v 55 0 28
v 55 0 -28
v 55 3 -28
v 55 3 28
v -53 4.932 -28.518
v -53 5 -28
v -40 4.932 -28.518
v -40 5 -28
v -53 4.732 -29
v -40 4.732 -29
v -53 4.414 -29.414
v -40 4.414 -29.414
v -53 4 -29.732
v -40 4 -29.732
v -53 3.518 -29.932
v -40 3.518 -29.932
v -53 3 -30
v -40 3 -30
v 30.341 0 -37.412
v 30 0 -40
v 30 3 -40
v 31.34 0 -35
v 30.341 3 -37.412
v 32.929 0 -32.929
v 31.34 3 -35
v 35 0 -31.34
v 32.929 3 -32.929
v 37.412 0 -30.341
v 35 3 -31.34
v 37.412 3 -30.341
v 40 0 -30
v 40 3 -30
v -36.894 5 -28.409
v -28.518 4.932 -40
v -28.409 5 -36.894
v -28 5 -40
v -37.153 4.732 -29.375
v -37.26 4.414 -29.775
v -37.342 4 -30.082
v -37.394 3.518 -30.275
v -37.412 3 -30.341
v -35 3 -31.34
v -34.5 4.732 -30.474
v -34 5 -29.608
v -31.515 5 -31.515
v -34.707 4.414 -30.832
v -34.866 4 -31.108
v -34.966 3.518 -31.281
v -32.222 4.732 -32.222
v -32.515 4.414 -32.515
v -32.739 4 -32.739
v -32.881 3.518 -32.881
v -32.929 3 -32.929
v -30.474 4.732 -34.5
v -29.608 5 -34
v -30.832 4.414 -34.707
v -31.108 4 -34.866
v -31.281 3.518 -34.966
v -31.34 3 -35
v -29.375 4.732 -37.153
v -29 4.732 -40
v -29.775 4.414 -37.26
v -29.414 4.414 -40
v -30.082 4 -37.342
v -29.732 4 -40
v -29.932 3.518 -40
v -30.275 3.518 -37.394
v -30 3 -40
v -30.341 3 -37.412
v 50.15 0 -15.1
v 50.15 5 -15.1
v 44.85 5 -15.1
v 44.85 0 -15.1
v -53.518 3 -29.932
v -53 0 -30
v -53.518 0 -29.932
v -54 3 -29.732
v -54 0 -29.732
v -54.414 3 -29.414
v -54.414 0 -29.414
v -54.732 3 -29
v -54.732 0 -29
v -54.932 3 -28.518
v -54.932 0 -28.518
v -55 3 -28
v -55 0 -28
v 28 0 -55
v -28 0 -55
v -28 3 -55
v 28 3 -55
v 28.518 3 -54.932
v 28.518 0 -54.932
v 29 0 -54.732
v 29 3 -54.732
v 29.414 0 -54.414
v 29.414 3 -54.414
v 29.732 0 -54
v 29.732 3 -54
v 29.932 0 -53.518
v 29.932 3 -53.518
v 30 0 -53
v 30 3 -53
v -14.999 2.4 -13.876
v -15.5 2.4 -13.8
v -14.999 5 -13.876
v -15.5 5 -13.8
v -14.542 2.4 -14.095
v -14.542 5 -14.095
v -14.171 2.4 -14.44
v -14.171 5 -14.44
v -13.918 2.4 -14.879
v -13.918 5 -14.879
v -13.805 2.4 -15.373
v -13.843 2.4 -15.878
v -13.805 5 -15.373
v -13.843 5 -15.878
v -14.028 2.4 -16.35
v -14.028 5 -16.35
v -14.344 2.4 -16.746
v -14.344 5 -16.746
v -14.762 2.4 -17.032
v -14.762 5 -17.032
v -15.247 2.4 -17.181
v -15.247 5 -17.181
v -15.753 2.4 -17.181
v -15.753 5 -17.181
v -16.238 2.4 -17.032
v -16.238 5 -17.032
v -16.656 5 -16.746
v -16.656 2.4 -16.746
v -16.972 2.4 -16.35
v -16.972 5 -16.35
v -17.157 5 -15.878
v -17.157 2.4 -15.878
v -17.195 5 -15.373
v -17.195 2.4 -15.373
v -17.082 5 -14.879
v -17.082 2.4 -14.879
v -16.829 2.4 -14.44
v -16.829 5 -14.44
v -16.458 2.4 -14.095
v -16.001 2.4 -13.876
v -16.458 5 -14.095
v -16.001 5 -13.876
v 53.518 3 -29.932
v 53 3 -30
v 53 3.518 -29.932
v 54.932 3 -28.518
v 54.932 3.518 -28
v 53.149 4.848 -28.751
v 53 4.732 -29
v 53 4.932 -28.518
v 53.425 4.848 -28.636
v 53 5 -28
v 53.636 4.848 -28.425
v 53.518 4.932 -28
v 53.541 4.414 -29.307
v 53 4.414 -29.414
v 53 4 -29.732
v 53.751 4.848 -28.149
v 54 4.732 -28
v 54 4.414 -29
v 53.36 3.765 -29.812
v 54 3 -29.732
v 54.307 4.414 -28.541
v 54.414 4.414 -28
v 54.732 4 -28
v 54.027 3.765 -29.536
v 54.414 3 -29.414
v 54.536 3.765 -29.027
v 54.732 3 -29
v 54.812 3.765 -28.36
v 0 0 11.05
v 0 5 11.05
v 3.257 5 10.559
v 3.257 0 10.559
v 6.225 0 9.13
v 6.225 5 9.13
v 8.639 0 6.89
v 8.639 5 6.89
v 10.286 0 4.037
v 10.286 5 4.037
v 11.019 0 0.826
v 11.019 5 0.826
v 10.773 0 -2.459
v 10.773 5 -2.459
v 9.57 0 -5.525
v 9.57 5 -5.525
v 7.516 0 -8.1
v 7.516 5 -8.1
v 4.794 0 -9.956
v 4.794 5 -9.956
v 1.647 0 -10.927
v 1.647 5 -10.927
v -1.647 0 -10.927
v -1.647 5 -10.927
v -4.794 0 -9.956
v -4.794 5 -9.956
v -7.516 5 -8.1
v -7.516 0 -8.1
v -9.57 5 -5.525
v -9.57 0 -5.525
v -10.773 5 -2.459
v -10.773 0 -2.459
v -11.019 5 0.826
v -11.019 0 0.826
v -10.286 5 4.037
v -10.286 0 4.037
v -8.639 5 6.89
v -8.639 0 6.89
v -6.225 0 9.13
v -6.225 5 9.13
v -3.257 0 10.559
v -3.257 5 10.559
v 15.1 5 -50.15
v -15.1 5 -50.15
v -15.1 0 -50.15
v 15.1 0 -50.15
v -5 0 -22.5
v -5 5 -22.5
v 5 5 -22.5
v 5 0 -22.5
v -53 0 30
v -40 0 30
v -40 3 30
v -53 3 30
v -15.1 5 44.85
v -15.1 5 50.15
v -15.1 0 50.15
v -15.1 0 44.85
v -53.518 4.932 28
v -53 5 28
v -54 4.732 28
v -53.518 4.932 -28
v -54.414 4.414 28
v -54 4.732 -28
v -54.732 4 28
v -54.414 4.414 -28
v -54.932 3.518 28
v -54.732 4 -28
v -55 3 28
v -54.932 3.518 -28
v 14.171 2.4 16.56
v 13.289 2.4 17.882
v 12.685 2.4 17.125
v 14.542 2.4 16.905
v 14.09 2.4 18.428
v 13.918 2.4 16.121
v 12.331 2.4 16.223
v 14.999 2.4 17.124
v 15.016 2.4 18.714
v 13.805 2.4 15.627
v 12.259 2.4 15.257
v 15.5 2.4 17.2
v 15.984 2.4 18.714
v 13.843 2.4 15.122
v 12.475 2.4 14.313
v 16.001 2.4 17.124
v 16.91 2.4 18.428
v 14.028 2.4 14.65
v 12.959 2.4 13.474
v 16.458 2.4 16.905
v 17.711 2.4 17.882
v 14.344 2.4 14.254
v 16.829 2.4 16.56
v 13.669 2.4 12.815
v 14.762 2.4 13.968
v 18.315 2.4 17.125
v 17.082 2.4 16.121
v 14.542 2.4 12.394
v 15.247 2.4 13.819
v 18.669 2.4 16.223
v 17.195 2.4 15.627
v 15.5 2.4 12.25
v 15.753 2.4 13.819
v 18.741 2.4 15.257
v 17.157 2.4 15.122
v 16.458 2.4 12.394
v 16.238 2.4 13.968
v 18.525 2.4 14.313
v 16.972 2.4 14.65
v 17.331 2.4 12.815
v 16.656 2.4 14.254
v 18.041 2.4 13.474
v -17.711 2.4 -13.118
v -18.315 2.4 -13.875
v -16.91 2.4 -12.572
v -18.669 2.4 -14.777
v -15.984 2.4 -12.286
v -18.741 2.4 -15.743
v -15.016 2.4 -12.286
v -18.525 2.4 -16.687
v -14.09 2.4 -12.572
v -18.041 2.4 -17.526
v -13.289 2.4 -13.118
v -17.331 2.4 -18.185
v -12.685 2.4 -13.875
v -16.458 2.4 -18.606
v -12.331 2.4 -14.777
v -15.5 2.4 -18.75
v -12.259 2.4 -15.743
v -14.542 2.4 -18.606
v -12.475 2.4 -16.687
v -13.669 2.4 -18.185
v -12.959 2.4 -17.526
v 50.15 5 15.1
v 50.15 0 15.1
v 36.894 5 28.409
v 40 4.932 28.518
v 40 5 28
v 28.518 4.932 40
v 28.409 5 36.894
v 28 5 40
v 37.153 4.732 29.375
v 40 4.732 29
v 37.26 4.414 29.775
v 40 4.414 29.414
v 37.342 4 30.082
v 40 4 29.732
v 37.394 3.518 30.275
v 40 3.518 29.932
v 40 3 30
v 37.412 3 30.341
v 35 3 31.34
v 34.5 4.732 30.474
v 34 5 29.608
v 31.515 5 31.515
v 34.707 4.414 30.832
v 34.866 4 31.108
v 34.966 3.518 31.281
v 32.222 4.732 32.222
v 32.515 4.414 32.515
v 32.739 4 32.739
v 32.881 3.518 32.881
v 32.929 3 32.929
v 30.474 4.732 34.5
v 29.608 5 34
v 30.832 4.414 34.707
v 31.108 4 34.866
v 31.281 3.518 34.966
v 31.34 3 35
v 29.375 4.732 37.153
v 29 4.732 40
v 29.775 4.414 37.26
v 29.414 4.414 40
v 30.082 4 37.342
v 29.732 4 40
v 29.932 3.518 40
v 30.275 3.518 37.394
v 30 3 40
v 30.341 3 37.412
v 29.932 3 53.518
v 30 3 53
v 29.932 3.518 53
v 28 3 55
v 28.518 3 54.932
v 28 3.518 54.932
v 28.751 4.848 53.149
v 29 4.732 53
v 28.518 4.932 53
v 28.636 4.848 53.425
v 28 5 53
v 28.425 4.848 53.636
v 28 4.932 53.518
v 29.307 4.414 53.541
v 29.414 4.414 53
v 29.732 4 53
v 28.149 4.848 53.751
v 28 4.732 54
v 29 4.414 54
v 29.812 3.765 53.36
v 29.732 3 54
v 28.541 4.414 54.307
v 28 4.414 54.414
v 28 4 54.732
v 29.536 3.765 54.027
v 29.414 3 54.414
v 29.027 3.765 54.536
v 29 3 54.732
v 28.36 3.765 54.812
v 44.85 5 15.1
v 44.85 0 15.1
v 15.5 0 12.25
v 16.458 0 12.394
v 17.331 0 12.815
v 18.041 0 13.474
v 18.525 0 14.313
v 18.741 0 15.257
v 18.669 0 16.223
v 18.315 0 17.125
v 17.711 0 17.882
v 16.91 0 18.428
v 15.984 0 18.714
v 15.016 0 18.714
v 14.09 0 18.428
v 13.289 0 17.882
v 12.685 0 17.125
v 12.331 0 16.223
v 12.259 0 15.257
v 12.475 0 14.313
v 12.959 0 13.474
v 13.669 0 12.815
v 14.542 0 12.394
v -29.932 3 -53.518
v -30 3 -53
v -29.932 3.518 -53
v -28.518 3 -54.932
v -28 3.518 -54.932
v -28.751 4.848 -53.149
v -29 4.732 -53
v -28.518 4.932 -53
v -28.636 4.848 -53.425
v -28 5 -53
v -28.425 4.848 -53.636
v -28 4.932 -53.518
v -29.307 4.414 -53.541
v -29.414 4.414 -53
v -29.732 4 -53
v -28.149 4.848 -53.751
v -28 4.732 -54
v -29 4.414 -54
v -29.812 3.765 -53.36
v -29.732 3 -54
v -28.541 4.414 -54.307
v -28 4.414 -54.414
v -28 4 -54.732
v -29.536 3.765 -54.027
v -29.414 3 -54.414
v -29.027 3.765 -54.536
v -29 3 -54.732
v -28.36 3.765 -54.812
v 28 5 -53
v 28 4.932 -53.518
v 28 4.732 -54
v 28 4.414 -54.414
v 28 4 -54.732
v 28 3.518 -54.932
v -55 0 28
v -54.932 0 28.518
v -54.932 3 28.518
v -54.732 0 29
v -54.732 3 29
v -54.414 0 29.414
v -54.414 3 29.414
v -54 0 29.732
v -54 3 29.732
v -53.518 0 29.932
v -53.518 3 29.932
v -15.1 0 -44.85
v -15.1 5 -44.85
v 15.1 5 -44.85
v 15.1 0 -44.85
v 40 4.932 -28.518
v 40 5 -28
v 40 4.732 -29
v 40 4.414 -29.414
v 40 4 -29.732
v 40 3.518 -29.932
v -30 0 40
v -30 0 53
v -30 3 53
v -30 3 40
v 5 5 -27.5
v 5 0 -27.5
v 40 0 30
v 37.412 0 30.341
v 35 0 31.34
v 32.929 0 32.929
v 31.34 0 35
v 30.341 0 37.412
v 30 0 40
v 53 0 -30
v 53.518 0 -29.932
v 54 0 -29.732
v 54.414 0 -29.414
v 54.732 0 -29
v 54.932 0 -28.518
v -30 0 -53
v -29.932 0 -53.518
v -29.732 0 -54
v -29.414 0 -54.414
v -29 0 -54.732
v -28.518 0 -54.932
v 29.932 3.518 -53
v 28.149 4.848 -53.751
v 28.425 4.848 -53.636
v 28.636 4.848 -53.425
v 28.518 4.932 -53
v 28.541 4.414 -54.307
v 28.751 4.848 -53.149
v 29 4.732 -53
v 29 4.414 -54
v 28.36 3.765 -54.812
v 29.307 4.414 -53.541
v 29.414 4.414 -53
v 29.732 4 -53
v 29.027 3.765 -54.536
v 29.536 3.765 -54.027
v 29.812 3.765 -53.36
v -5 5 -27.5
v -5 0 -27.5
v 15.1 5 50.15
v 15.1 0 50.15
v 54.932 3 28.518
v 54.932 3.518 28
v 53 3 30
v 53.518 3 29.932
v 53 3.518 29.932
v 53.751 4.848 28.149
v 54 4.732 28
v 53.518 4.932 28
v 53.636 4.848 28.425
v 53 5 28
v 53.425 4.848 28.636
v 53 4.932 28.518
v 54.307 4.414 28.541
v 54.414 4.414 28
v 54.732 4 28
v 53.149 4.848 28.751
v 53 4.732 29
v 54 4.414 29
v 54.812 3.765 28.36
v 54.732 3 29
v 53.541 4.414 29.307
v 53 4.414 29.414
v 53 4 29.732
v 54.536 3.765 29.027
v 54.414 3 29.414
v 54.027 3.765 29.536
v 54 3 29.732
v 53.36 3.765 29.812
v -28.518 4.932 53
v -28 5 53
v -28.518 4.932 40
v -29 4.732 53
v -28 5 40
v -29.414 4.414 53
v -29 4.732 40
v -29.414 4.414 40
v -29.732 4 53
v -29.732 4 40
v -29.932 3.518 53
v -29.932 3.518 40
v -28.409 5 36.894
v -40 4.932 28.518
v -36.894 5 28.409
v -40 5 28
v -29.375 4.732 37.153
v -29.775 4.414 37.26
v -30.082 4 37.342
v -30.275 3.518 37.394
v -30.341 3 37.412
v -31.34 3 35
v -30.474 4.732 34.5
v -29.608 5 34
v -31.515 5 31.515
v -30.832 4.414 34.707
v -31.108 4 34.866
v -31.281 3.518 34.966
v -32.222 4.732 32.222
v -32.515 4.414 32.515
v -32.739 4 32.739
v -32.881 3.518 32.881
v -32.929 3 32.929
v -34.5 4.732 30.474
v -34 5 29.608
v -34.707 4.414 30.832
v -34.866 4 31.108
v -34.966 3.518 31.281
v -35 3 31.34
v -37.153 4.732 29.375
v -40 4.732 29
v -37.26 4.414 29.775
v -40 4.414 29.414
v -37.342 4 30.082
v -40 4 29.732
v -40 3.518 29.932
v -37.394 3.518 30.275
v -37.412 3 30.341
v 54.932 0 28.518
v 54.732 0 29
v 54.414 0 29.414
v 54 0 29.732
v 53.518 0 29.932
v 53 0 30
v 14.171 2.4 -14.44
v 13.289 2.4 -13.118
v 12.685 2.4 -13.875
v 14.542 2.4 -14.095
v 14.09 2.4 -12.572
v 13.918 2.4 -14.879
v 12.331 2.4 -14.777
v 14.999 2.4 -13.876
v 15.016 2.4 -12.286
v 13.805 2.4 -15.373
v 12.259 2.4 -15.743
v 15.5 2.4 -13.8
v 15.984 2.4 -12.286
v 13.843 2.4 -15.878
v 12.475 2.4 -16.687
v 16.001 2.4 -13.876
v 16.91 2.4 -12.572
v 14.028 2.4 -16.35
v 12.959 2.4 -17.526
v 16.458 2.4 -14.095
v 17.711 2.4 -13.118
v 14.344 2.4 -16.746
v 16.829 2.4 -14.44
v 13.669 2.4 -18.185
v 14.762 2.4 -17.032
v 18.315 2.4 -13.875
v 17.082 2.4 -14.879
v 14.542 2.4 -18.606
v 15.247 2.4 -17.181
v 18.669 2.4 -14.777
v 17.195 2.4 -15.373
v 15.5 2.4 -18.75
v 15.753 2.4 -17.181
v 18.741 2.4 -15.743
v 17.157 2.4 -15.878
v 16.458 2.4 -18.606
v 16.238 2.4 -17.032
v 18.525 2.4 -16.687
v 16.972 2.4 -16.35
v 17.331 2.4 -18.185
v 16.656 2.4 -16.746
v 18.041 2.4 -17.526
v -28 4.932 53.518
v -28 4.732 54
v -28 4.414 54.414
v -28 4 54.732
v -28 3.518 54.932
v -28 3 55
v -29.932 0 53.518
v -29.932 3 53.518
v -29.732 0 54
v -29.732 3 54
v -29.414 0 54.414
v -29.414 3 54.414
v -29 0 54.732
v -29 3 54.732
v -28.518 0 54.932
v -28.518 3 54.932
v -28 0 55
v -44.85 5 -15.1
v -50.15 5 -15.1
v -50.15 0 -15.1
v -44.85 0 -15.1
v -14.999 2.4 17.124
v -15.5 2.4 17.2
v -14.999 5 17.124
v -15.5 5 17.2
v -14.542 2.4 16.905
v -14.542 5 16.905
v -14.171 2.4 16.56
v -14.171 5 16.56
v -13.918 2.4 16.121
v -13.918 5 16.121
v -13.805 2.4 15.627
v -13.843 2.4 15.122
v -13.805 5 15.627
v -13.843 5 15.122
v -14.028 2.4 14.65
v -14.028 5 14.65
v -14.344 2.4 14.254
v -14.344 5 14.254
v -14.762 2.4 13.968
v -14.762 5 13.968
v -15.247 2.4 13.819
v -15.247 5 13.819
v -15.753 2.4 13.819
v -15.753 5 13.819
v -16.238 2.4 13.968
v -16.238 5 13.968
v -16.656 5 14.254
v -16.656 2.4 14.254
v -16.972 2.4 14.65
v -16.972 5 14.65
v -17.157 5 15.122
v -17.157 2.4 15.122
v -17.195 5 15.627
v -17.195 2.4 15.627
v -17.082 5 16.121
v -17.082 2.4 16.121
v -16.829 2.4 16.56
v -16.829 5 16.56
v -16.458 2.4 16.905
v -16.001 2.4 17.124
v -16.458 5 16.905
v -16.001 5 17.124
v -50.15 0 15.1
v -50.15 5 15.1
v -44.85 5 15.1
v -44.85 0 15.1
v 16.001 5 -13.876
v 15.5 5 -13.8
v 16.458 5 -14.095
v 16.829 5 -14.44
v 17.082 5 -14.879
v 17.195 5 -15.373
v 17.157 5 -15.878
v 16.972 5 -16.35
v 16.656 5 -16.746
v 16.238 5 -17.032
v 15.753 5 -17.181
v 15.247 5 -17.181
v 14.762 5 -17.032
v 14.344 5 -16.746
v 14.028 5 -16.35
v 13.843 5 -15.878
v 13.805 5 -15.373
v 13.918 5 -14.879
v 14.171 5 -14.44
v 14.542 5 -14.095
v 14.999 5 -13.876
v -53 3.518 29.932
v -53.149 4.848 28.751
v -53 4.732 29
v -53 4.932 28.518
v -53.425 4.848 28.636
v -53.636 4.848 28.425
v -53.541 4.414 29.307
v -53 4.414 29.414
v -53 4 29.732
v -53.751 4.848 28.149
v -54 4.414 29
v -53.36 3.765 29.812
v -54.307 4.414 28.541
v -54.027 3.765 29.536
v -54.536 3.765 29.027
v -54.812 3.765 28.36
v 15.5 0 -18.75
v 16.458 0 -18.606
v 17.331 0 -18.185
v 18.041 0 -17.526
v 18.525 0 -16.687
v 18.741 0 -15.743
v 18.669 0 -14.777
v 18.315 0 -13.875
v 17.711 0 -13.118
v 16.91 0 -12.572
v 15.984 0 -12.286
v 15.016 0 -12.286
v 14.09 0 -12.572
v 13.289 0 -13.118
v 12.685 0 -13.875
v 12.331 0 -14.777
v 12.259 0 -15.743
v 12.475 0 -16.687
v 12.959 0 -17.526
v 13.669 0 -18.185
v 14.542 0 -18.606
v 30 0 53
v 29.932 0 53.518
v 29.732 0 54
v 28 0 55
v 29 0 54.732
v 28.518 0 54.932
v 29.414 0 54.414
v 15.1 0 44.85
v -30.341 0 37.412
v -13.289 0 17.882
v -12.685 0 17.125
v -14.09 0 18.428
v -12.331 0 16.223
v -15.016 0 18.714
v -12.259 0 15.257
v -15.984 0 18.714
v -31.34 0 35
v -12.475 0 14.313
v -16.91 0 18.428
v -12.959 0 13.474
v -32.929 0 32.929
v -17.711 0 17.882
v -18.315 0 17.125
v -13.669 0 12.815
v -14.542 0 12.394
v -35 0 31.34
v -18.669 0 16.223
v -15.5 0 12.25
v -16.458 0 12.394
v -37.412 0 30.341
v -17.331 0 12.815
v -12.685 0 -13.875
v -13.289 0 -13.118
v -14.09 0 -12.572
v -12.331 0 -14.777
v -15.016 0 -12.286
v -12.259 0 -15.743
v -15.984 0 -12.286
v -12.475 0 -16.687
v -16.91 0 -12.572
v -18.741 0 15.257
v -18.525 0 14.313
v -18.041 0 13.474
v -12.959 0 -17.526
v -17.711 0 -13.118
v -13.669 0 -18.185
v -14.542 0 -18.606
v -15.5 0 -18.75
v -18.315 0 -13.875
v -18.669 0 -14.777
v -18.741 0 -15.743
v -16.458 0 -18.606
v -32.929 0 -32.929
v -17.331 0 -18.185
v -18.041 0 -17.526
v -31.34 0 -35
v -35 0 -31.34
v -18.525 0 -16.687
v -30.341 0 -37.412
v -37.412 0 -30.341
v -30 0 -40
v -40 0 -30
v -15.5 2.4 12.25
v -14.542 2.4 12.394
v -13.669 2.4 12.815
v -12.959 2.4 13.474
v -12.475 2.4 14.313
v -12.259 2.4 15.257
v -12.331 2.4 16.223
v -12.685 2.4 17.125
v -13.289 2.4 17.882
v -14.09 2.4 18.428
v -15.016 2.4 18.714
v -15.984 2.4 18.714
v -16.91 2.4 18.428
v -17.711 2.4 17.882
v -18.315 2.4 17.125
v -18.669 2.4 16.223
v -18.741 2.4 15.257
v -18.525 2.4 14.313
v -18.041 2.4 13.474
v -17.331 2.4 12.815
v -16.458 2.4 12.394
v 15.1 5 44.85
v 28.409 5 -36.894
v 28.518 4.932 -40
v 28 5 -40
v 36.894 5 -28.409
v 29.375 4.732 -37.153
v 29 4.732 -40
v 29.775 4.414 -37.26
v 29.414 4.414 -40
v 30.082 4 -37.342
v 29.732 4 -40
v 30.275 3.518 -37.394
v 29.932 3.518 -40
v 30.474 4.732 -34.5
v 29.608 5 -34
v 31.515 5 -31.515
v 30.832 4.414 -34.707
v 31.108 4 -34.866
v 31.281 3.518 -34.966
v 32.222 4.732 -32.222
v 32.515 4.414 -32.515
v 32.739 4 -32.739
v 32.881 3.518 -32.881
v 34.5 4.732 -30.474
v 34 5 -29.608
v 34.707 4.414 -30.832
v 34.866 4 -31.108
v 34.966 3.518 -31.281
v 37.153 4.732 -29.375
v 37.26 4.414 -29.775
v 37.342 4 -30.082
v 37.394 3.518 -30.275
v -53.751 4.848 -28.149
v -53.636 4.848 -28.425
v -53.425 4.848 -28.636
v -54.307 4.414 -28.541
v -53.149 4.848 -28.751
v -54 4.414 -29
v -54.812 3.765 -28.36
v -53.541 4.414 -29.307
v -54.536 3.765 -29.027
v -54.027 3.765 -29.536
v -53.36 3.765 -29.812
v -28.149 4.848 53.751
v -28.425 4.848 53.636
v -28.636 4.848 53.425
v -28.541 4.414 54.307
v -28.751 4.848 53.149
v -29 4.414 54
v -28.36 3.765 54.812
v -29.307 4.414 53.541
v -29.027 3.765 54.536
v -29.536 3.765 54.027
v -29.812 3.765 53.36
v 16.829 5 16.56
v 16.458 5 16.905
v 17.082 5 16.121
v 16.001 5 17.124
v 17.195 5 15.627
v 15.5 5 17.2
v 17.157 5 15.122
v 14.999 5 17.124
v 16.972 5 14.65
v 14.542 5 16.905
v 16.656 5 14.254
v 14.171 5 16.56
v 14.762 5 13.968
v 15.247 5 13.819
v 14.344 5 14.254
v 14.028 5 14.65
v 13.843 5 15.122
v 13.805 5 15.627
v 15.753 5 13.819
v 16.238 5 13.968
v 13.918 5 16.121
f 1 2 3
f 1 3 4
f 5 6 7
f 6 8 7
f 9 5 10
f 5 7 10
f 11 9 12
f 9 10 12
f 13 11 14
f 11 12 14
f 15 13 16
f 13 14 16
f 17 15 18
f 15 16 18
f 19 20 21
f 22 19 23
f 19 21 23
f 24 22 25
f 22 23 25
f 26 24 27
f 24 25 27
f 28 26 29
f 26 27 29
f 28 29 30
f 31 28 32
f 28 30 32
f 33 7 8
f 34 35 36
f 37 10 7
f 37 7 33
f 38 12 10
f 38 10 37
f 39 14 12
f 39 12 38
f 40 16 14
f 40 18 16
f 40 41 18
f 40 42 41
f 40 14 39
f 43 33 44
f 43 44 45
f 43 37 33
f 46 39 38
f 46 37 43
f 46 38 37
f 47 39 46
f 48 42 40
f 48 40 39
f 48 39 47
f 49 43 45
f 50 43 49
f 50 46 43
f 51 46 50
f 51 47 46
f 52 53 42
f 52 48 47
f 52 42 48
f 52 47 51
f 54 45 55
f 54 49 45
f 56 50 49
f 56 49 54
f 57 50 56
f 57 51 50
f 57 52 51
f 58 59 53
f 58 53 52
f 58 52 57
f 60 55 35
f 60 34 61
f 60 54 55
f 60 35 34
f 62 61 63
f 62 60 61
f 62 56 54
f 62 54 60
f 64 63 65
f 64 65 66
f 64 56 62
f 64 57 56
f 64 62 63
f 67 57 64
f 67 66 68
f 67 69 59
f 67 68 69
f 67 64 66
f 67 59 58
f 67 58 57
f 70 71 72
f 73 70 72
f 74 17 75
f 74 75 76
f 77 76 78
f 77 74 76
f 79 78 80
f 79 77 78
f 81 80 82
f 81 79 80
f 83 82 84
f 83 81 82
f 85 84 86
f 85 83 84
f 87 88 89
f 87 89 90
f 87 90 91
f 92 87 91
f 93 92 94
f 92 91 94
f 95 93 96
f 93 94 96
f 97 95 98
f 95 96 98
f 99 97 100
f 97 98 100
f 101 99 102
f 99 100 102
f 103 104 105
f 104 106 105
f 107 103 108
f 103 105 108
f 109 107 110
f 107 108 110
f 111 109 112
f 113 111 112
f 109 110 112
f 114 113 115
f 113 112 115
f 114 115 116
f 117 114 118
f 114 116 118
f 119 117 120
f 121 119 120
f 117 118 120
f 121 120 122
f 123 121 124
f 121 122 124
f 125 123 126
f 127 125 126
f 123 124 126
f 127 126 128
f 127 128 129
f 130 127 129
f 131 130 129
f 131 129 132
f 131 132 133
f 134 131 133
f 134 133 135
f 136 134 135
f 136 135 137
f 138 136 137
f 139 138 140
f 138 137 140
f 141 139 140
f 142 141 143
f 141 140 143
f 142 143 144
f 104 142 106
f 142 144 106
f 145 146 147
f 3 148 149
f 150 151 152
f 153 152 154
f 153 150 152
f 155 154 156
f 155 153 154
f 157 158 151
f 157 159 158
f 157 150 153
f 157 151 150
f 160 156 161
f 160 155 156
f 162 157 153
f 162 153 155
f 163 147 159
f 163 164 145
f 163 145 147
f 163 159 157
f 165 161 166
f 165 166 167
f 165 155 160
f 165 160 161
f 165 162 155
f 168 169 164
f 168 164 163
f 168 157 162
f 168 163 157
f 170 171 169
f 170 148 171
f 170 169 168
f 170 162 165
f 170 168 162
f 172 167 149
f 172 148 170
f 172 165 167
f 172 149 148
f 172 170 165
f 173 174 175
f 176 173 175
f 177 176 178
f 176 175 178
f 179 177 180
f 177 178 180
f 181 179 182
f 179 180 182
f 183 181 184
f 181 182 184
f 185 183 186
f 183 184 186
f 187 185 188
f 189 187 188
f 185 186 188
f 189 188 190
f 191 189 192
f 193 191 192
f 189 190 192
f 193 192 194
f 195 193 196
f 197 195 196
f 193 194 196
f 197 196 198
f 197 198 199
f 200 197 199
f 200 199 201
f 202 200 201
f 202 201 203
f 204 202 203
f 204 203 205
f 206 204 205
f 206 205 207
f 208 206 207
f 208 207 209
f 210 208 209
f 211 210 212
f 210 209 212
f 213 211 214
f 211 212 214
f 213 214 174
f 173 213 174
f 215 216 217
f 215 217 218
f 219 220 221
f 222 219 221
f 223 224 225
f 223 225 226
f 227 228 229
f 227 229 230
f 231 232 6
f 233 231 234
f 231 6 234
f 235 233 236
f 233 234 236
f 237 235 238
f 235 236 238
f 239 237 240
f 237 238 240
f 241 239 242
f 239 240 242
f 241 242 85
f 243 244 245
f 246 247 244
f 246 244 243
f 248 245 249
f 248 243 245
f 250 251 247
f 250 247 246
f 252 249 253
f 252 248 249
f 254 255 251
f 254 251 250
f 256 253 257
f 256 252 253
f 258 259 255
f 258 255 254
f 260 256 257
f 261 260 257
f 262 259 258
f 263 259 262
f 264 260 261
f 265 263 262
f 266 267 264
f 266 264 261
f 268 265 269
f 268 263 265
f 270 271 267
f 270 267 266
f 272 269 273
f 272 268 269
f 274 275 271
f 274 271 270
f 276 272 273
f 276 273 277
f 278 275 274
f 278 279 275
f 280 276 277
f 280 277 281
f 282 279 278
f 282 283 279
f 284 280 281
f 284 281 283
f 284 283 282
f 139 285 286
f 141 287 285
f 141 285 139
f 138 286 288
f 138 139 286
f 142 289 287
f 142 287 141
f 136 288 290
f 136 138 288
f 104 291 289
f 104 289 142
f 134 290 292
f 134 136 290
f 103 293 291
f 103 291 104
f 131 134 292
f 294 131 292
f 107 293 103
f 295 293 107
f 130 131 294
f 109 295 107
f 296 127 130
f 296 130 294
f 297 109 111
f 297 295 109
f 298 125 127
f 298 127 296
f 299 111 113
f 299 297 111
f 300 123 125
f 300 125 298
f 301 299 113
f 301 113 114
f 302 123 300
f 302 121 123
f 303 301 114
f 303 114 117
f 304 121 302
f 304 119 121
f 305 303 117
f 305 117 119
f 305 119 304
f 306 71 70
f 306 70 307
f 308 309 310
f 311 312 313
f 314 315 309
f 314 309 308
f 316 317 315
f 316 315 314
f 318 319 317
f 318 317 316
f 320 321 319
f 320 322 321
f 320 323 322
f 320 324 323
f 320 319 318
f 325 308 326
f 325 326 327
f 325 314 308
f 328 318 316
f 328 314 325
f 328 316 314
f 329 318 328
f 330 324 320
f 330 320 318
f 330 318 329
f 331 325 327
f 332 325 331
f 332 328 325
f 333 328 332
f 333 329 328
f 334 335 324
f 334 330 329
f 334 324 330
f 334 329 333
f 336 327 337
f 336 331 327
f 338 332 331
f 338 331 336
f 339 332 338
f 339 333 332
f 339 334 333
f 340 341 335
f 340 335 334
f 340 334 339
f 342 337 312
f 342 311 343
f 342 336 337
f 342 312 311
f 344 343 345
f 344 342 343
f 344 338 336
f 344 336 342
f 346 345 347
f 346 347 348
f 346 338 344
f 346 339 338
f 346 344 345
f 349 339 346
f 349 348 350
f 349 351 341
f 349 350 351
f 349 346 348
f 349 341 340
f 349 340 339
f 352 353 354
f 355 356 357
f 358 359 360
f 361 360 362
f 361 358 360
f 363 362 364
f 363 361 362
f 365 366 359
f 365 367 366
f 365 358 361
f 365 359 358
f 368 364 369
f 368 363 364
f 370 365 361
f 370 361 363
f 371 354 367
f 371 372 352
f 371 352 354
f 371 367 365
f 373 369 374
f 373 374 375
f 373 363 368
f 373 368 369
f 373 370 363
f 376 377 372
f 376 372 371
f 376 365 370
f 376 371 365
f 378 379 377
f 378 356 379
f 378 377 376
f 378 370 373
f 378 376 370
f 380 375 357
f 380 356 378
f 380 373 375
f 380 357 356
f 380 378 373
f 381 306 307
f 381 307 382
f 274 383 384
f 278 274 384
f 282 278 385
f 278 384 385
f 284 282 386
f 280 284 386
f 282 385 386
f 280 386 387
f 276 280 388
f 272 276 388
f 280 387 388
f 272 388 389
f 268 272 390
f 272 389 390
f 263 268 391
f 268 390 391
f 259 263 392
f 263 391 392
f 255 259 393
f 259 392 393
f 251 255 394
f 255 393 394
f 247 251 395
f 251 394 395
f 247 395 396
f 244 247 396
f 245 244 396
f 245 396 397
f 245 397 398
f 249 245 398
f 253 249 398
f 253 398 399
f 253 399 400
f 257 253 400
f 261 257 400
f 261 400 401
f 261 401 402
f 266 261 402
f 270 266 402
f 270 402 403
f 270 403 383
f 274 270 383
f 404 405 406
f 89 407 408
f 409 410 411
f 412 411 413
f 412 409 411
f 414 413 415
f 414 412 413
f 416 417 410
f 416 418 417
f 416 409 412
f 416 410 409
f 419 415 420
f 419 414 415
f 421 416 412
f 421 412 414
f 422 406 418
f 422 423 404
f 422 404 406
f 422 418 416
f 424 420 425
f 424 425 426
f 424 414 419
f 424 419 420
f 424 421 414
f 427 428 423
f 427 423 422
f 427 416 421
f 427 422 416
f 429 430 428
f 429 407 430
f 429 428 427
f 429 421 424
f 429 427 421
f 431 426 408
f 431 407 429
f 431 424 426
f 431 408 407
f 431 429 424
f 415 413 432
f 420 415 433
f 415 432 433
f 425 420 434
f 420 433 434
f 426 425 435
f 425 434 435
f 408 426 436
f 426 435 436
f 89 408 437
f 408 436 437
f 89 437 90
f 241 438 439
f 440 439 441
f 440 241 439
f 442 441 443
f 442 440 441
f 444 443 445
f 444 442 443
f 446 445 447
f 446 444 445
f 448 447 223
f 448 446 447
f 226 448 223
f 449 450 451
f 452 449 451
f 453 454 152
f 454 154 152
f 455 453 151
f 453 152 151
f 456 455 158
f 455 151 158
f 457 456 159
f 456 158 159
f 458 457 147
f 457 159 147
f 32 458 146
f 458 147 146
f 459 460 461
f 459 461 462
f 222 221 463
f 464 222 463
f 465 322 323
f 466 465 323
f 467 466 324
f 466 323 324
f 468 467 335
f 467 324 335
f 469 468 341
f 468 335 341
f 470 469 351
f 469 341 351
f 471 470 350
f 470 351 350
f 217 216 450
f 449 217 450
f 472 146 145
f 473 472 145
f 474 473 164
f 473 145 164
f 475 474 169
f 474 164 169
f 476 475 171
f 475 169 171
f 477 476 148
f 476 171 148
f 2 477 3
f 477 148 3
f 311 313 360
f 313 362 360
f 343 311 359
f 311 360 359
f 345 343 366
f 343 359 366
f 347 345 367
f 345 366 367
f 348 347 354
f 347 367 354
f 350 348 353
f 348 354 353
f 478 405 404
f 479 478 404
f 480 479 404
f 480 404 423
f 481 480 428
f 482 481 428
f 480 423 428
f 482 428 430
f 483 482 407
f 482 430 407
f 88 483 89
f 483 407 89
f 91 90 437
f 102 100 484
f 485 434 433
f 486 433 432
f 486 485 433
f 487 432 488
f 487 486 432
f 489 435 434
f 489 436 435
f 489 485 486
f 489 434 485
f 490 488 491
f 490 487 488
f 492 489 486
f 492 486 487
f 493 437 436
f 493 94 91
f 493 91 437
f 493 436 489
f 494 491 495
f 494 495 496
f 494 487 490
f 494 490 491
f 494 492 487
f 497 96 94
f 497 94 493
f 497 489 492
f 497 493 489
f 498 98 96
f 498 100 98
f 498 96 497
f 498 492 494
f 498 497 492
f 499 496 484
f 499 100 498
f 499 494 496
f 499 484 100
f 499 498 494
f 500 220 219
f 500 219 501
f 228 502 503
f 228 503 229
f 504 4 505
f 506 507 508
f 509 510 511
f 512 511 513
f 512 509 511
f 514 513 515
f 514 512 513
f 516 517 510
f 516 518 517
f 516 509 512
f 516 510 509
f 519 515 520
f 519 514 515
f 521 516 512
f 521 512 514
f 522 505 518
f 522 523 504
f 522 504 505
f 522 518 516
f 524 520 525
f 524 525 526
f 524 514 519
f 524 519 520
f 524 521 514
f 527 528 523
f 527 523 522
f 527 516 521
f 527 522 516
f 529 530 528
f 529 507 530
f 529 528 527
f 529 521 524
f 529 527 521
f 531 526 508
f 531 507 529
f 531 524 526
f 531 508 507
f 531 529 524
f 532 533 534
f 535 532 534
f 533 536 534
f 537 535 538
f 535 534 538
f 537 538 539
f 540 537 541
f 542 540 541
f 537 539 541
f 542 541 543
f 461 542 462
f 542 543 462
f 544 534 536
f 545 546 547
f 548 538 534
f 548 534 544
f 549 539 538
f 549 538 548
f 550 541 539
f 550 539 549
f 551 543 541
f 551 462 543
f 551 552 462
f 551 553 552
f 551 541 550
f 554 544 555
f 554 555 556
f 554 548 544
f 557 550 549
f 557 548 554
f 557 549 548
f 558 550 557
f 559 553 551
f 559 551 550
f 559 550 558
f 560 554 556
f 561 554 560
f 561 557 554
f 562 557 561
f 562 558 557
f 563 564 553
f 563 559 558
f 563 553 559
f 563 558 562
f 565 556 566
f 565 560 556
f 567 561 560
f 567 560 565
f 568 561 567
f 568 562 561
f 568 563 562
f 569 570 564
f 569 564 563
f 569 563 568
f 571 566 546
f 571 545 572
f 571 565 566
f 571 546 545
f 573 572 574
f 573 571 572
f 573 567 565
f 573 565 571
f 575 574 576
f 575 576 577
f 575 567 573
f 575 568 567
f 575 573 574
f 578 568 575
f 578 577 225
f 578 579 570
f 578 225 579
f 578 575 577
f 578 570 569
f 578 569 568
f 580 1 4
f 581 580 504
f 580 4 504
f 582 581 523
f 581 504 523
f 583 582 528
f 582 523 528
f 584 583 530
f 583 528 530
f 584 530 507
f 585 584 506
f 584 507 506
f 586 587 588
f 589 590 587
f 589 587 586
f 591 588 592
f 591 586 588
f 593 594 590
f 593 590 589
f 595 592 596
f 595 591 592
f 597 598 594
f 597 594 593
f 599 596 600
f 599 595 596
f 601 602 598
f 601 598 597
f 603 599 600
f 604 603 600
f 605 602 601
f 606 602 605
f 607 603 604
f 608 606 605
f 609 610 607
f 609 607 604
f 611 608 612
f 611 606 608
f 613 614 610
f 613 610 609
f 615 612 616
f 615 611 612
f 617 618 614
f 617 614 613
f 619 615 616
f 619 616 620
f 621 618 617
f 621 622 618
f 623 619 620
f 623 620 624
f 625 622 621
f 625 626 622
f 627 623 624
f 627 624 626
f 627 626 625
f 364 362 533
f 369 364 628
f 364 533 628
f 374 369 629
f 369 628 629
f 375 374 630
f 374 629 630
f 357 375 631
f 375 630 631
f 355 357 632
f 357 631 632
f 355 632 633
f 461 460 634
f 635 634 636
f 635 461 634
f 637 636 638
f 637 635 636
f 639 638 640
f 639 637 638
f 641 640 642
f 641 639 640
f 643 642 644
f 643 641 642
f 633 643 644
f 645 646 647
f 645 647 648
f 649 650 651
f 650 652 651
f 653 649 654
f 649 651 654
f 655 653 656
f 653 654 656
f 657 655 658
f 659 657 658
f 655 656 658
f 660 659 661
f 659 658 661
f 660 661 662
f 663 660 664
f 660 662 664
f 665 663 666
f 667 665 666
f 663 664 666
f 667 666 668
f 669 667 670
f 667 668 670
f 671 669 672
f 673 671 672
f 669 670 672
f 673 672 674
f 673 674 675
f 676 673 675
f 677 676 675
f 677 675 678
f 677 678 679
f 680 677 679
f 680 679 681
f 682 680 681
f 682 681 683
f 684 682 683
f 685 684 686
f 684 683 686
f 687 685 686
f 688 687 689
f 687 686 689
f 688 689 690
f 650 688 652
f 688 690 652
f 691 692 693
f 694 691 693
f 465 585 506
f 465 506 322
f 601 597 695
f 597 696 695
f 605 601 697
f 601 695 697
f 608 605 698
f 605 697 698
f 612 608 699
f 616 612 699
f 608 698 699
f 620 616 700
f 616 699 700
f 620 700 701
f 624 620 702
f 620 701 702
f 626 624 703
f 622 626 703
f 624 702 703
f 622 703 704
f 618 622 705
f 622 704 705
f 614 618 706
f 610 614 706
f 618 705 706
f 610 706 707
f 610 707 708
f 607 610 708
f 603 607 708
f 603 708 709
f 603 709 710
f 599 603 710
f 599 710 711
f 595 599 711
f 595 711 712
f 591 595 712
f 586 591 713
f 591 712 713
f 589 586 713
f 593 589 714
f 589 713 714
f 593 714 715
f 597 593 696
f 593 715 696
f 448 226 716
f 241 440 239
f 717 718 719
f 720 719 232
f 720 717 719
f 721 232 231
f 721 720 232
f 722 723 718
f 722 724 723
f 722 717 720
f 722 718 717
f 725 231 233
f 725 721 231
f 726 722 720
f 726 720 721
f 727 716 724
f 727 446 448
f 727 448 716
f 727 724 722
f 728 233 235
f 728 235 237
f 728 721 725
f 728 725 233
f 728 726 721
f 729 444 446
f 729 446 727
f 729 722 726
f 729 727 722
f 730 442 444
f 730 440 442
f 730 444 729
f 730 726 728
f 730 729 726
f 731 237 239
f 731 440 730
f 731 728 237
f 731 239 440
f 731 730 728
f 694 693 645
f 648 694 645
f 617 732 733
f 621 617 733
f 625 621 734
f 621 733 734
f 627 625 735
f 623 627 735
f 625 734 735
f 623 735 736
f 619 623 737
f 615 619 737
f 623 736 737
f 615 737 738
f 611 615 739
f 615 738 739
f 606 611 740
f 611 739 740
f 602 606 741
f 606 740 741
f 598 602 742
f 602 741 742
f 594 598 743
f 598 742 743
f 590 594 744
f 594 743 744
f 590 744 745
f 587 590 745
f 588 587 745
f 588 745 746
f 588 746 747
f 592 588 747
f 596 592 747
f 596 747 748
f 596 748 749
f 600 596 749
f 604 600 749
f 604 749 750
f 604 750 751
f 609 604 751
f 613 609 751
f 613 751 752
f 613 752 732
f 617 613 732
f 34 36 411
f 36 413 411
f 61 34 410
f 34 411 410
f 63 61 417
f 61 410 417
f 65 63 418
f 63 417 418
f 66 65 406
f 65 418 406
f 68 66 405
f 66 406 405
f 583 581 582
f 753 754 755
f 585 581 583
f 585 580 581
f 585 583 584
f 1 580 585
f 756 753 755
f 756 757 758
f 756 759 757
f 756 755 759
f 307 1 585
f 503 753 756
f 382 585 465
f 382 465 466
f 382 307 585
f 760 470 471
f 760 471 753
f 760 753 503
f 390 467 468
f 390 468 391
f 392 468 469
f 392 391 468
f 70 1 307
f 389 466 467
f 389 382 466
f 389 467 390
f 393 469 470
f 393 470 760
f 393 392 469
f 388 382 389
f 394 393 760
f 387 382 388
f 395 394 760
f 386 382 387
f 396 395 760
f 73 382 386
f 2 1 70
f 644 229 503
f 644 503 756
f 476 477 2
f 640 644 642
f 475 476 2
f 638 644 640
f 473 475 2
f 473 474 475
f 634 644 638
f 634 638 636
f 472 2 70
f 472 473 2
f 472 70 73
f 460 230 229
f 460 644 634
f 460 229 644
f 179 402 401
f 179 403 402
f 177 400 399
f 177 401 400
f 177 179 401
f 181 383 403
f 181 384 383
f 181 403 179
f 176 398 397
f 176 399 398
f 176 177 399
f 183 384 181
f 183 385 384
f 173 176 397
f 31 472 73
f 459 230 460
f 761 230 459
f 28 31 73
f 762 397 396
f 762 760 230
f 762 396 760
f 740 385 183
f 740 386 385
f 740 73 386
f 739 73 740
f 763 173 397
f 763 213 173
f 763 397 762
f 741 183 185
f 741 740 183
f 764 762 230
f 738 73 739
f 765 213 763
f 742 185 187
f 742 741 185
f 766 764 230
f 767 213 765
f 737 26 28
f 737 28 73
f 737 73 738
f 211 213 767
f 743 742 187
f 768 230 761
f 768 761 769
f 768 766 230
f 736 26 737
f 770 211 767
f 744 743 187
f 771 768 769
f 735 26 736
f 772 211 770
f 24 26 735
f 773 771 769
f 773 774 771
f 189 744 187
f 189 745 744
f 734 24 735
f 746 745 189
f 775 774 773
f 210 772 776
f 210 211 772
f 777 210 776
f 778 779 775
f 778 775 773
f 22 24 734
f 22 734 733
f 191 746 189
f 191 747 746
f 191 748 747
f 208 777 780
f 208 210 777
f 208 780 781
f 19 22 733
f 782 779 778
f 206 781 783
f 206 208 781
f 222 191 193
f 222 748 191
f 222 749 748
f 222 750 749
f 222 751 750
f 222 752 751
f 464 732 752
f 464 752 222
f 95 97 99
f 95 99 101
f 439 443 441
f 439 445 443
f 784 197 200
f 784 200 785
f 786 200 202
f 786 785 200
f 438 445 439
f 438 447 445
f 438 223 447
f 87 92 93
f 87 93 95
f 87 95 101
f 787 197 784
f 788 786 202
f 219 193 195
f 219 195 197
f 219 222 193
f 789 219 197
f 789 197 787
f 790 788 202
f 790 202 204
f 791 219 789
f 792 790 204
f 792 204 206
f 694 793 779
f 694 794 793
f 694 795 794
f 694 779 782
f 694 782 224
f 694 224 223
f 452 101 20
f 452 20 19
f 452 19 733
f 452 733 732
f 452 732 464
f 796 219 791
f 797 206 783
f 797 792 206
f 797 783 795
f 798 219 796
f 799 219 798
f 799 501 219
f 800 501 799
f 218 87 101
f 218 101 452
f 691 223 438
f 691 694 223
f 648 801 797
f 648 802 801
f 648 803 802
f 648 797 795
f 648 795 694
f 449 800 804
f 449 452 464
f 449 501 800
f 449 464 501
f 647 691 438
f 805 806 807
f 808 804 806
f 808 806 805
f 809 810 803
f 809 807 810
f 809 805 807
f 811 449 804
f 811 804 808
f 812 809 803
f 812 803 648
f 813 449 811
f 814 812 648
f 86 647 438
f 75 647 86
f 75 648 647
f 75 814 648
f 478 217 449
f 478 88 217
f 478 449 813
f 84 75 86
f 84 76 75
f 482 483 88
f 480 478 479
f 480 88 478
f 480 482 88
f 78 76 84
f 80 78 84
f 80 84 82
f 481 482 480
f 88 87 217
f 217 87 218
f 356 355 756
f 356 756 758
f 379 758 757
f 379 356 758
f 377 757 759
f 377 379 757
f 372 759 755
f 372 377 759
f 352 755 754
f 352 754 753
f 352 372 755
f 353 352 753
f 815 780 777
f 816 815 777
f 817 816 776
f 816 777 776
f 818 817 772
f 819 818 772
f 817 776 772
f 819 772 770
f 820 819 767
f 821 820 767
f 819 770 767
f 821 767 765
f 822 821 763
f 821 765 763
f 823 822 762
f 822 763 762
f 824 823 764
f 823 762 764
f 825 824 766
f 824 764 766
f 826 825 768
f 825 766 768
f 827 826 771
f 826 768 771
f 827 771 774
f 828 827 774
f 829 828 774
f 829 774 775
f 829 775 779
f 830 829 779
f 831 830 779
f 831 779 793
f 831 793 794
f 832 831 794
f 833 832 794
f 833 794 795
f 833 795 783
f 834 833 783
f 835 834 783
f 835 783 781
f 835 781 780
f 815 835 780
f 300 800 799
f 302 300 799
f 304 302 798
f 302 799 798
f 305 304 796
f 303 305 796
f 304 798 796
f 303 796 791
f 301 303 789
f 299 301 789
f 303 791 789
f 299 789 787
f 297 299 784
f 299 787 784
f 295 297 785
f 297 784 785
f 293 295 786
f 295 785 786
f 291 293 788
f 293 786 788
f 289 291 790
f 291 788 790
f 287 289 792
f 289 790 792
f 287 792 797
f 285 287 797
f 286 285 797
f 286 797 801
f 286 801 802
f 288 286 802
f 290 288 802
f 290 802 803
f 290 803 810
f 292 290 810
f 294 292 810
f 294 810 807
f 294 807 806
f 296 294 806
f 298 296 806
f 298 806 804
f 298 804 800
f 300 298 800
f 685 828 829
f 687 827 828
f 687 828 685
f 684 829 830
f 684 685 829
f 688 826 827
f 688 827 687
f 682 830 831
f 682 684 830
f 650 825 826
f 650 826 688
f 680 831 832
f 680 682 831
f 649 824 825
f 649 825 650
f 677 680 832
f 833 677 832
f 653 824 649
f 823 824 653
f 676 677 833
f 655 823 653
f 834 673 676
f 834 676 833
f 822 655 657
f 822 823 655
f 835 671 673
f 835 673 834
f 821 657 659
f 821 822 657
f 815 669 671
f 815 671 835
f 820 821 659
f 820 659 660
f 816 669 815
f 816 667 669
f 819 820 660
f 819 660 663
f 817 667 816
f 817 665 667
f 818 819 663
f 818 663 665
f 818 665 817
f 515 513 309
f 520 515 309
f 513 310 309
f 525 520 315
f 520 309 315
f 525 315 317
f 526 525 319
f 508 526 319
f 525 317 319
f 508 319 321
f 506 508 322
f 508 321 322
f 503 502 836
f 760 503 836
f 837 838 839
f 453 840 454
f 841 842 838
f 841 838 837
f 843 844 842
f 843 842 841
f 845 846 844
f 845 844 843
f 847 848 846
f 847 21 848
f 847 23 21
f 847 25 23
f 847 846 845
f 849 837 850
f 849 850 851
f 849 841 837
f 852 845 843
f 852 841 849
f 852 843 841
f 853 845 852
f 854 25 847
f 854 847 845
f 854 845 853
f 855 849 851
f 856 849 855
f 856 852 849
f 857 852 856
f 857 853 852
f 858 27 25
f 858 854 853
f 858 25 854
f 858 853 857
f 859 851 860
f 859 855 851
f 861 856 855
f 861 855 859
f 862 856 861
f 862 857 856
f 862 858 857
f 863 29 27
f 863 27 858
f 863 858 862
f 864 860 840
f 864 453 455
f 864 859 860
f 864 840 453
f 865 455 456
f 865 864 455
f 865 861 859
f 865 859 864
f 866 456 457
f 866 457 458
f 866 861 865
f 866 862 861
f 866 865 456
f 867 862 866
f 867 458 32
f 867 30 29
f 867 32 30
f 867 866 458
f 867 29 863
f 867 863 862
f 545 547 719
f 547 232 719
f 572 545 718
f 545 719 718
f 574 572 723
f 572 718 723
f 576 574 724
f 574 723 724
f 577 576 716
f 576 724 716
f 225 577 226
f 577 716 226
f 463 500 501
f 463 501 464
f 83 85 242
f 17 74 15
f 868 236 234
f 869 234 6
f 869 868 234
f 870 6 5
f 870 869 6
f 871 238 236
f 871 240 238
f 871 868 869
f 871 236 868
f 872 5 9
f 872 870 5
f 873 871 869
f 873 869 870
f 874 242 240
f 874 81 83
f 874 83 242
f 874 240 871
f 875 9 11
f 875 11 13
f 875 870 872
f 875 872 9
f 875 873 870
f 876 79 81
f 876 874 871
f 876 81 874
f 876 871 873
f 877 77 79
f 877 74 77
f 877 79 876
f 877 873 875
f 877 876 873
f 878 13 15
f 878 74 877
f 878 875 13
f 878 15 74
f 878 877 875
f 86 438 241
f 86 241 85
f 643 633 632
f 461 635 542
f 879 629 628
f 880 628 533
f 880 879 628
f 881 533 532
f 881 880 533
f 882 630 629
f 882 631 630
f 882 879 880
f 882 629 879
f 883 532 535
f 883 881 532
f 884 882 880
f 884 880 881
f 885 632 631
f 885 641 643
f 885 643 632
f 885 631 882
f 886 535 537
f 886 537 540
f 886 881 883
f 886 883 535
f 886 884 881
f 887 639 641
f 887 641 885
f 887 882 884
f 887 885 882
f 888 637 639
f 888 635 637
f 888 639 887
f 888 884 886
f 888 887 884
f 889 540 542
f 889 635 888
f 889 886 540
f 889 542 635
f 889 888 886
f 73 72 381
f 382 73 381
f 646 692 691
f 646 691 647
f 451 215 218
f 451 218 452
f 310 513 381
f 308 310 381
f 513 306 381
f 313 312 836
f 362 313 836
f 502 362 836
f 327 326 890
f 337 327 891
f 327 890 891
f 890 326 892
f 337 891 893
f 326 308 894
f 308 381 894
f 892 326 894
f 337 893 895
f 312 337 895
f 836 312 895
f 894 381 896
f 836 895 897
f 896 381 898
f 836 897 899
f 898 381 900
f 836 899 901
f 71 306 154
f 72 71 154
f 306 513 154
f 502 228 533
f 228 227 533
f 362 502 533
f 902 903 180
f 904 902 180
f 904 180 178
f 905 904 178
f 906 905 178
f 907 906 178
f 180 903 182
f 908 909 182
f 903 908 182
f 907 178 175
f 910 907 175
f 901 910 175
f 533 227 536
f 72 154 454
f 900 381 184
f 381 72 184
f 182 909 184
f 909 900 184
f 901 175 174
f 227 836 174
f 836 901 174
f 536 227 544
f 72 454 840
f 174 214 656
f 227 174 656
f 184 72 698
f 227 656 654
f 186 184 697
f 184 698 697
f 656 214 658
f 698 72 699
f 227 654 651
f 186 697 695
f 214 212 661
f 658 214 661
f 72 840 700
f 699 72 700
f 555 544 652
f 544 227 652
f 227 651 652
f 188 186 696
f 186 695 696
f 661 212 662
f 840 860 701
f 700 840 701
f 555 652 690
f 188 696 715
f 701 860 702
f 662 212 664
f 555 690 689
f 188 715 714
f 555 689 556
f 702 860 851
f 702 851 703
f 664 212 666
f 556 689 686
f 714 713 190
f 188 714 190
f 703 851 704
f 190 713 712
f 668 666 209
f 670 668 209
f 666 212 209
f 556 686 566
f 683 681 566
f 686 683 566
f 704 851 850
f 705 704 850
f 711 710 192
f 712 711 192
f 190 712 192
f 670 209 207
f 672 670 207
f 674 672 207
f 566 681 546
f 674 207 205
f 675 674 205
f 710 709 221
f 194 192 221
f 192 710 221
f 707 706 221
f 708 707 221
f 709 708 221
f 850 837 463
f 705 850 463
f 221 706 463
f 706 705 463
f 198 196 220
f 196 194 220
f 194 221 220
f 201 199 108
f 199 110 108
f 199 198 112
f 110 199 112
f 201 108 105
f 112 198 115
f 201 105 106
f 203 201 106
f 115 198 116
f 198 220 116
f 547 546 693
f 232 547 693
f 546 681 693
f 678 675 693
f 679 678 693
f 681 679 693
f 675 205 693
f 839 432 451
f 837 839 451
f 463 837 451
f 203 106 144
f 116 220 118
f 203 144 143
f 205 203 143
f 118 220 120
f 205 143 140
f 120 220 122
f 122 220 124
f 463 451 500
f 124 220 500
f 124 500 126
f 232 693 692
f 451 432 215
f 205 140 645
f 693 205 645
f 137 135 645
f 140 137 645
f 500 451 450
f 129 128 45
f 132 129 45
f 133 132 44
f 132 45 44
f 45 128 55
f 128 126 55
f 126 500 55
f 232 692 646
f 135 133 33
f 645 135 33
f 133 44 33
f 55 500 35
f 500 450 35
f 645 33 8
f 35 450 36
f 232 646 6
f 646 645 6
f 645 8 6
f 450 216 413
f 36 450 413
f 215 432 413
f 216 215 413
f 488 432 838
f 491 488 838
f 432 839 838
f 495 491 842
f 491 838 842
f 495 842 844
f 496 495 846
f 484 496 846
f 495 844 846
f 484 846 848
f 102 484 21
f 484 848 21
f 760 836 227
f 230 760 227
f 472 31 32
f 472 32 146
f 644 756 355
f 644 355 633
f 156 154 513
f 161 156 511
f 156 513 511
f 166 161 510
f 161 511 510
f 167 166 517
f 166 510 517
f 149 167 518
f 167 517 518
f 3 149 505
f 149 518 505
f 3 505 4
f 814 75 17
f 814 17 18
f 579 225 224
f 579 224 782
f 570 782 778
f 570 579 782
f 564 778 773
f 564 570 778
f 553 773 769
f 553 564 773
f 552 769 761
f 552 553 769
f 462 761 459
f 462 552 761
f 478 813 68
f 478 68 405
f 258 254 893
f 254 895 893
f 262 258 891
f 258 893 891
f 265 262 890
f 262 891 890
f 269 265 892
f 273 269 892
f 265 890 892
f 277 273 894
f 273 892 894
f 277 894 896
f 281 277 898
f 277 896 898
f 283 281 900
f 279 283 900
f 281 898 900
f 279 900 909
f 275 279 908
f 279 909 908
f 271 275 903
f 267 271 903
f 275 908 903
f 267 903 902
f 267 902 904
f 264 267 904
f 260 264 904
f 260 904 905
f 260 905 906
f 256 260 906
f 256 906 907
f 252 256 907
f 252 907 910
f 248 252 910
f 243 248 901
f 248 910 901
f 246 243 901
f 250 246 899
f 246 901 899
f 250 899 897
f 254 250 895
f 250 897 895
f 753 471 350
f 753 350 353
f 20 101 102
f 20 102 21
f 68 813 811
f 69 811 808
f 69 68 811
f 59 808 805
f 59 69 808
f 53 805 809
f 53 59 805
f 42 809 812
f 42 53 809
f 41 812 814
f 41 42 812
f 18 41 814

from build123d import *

# Parameters (mm, degrees)
BOSS_EXTRUDE1_DEPTH                                  = 5
CUT_EXTRUDE1_REACH                                   = 79.942
SKETCH2_R                                            = 11.05
SKETCH2_W                                            = 5.3
SKETCH2_H                                            = 30.2
CIRPATTERN1_COUNT                                    = 4
CBORE_FOR_M3_HEX_SOCKET_THIN_HEAD_CAP_SC_D           = 3.4
CBORE_FOR_M3_HEX_SOCKET_THIN_HEAD_CAP_SC_CBORE_D     = 6.5
CBORE_FOR_M3_HEX_SOCKET_THIN_HEAD_CAP_SC_CBORE_DEPTH = 2.4
FILLET1_R                                            = 10
FILLET2_R                                            = 2
FILLET3_R                                            = 2
CUT_EXTRUDE2_REACH                                   = 79.942
SKETCH6_W                                            = 10
SKETCH6_H                                            = 5


with BuildPart() as part:
    # Sketch1 → Boss-Extrude1 (new body)
    with BuildSketch(Plane(origin=(0, 0, 0), x_dir=(1, 0, 0), z_dir=(0, 1, 0))):
        Polygon((-30, 55), (30, 55), (30, 30), (55, 30), (55, -30), (30, -30), (30, -55), (-30, -55), (-30, -30), (-55, -30), (-55, 30), (-30, 30), align=None)
    extrude(amount=BOSS_EXTRUDE1_DEPTH)

    # Sketch2 → Cut-Extrude1 (cut, up to next)
    with BuildSketch(Plane(origin=(0, 5, 0), x_dir=(1, 0, 0), z_dir=(0, 1, 0)), mode=Mode.PRIVATE) as cut_extrude1_sk1:
        with Locations(Location((0, 0, 0), (0, 0, 270))):
            Circle(SKETCH2_R)
    cut_extrude1_tool1 = extrude(cut_extrude1_sk1.sketch, amount=-CUT_EXTRUDE1_REACH, mode=Mode.PRIVATE) & part.part
    # Sketch2 → Cut-Extrude1 (cut, up to next)
    with BuildSketch(Plane(origin=(0, 5, 0), x_dir=(1, 0, 0), z_dir=(0, 1, 0)), mode=Mode.PRIVATE) as cut_extrude1_sk2:
        with Locations((-47.5, 0)):
            Rectangle(SKETCH2_W, SKETCH2_H)
    cut_extrude1_tool2 = extrude(cut_extrude1_sk2.sketch, amount=-CUT_EXTRUDE1_REACH, mode=Mode.PRIVATE) & part.part
    cut_extrude1_1 = cut_extrude1_tool1.solids().sort_by_distance((0, 5, 0))[0]
    add(cut_extrude1_1, mode=Mode.SUBTRACT)
    cut_extrude1_2 = cut_extrude1_tool2.solids().sort_by_distance((-47.5, 5, 0))[0]
    add(cut_extrude1_2, mode=Mode.SUBTRACT)
    cut_extrude1 = cut_extrude1_1 + cut_extrude1_2  # Cut-Extrude1 as one shape, for the pattern or mirror that repeats it

    # CirPattern1: Cut-Extrude1 ×4 about axis
    cirpattern1_axis = Axis((0, 0, 0), (0, 1, 0))
    for i in range(1, CIRPATTERN1_COUNT):
        add(cut_extrude1.rotate(cirpattern1_axis, i * 360 / CIRPATTERN1_COUNT), mode=Mode.SUBTRACT)

    # CBORE for M3 Hex Socket Thin Head Cap Screw1 (through all)
    with Locations(Plane(origin=(-15.5, 0, 15.5), x_dir=(0, 0, -1), z_dir=(0, -1, 0))):
        with Locations((0, 0), (31, 0), (31, 31), (0, 31)):
            CounterBoreHole(CBORE_FOR_M3_HEX_SOCKET_THIN_HEAD_CAP_SC_D / 2, CBORE_FOR_M3_HEX_SOCKET_THIN_HEAD_CAP_SC_CBORE_D / 2, CBORE_FOR_M3_HEX_SOCKET_THIN_HEAD_CAP_SC_CBORE_DEPTH)

    # Fillet1
    fillet1_edges = [part.edges().sort_by_distance(p)[0] for p in [
        (30, 2.5, -30),
        (30, 2.5, 30),
        (-30, 2.5, 30),
        (-30, 2.5, -30),
    ]]
    fillet(fillet1_edges, radius=FILLET1_R)

    # Fillet2
    fillet2_edges = [part.edges().sort_by_distance(p)[0] for p in [
        (-30, 2.5, -55),
        (30, 2.5, -55),
        (55, 2.5, -30),
        (55, 2.5, 30),
        (30, 2.5, 55),
        (-30, 2.5, 55),
        (-55, 2.5, 30),
        (-55, 2.5, -30),
    ]]
    fillet(fillet2_edges, radius=FILLET2_R)

    # Fillet3
    fillet3_edges = [part.edges().sort_by_distance(p)[0] for p in [
        (-46.5, 5, -30),
        (30, 5, -46.5),
        (46.5, 5, 30),
        (-30, 5, 46.5),
        (-32.928932188, 5, -32.928932188),
        (32.928932188, 5, -32.928932188),
        (32.928932188, 5, 32.928932188),
        (-32.928932188, 5, 32.928932188),
        (-55, 5, 0),
        (-30, 5, -46.5),
        (-46.5, 5, 30),
        (0, 5, 55),
        (30, 5, 46.5),
        (55, 5, 0),
        (46.5, 5, -30),
        (0, 5, -55),
        (-29.414213562, 5, -54.414213562),
        (54.414213562, 5, -29.414213562),
        (29.414213562, 5, -54.414213562),
        (29.414213562, 5, 54.414213562),
        (54.414213562, 5, 29.414213562),
        (-54.414213562, 5, 29.414213562),
        (-29.414213562, 5, 54.414213562),
        (-54.414213562, 5, -29.414213562),
    ]]
    fillet(fillet3_edges, radius=FILLET3_R)

    # Sketch6 → Cut-Extrude2 (cut, up to next)
    with BuildSketch(Plane(origin=(0, 5, 0), x_dir=(1, 0, 0), z_dir=(0, 1, 0)), mode=Mode.PRIVATE) as cut_extrude2_sk1:
        with Locations((0, 25)):
            Rectangle(SKETCH6_W, SKETCH6_H)
    cut_extrude2_tool1 = extrude(cut_extrude2_sk1.sketch, amount=-CUT_EXTRUDE2_REACH, mode=Mode.PRIVATE) & part.part
    add(cut_extrude2_tool1.solids().sort_by_distance((0, 5, -25))[0], mode=Mode.SUBTRACT)


solid = part.part
